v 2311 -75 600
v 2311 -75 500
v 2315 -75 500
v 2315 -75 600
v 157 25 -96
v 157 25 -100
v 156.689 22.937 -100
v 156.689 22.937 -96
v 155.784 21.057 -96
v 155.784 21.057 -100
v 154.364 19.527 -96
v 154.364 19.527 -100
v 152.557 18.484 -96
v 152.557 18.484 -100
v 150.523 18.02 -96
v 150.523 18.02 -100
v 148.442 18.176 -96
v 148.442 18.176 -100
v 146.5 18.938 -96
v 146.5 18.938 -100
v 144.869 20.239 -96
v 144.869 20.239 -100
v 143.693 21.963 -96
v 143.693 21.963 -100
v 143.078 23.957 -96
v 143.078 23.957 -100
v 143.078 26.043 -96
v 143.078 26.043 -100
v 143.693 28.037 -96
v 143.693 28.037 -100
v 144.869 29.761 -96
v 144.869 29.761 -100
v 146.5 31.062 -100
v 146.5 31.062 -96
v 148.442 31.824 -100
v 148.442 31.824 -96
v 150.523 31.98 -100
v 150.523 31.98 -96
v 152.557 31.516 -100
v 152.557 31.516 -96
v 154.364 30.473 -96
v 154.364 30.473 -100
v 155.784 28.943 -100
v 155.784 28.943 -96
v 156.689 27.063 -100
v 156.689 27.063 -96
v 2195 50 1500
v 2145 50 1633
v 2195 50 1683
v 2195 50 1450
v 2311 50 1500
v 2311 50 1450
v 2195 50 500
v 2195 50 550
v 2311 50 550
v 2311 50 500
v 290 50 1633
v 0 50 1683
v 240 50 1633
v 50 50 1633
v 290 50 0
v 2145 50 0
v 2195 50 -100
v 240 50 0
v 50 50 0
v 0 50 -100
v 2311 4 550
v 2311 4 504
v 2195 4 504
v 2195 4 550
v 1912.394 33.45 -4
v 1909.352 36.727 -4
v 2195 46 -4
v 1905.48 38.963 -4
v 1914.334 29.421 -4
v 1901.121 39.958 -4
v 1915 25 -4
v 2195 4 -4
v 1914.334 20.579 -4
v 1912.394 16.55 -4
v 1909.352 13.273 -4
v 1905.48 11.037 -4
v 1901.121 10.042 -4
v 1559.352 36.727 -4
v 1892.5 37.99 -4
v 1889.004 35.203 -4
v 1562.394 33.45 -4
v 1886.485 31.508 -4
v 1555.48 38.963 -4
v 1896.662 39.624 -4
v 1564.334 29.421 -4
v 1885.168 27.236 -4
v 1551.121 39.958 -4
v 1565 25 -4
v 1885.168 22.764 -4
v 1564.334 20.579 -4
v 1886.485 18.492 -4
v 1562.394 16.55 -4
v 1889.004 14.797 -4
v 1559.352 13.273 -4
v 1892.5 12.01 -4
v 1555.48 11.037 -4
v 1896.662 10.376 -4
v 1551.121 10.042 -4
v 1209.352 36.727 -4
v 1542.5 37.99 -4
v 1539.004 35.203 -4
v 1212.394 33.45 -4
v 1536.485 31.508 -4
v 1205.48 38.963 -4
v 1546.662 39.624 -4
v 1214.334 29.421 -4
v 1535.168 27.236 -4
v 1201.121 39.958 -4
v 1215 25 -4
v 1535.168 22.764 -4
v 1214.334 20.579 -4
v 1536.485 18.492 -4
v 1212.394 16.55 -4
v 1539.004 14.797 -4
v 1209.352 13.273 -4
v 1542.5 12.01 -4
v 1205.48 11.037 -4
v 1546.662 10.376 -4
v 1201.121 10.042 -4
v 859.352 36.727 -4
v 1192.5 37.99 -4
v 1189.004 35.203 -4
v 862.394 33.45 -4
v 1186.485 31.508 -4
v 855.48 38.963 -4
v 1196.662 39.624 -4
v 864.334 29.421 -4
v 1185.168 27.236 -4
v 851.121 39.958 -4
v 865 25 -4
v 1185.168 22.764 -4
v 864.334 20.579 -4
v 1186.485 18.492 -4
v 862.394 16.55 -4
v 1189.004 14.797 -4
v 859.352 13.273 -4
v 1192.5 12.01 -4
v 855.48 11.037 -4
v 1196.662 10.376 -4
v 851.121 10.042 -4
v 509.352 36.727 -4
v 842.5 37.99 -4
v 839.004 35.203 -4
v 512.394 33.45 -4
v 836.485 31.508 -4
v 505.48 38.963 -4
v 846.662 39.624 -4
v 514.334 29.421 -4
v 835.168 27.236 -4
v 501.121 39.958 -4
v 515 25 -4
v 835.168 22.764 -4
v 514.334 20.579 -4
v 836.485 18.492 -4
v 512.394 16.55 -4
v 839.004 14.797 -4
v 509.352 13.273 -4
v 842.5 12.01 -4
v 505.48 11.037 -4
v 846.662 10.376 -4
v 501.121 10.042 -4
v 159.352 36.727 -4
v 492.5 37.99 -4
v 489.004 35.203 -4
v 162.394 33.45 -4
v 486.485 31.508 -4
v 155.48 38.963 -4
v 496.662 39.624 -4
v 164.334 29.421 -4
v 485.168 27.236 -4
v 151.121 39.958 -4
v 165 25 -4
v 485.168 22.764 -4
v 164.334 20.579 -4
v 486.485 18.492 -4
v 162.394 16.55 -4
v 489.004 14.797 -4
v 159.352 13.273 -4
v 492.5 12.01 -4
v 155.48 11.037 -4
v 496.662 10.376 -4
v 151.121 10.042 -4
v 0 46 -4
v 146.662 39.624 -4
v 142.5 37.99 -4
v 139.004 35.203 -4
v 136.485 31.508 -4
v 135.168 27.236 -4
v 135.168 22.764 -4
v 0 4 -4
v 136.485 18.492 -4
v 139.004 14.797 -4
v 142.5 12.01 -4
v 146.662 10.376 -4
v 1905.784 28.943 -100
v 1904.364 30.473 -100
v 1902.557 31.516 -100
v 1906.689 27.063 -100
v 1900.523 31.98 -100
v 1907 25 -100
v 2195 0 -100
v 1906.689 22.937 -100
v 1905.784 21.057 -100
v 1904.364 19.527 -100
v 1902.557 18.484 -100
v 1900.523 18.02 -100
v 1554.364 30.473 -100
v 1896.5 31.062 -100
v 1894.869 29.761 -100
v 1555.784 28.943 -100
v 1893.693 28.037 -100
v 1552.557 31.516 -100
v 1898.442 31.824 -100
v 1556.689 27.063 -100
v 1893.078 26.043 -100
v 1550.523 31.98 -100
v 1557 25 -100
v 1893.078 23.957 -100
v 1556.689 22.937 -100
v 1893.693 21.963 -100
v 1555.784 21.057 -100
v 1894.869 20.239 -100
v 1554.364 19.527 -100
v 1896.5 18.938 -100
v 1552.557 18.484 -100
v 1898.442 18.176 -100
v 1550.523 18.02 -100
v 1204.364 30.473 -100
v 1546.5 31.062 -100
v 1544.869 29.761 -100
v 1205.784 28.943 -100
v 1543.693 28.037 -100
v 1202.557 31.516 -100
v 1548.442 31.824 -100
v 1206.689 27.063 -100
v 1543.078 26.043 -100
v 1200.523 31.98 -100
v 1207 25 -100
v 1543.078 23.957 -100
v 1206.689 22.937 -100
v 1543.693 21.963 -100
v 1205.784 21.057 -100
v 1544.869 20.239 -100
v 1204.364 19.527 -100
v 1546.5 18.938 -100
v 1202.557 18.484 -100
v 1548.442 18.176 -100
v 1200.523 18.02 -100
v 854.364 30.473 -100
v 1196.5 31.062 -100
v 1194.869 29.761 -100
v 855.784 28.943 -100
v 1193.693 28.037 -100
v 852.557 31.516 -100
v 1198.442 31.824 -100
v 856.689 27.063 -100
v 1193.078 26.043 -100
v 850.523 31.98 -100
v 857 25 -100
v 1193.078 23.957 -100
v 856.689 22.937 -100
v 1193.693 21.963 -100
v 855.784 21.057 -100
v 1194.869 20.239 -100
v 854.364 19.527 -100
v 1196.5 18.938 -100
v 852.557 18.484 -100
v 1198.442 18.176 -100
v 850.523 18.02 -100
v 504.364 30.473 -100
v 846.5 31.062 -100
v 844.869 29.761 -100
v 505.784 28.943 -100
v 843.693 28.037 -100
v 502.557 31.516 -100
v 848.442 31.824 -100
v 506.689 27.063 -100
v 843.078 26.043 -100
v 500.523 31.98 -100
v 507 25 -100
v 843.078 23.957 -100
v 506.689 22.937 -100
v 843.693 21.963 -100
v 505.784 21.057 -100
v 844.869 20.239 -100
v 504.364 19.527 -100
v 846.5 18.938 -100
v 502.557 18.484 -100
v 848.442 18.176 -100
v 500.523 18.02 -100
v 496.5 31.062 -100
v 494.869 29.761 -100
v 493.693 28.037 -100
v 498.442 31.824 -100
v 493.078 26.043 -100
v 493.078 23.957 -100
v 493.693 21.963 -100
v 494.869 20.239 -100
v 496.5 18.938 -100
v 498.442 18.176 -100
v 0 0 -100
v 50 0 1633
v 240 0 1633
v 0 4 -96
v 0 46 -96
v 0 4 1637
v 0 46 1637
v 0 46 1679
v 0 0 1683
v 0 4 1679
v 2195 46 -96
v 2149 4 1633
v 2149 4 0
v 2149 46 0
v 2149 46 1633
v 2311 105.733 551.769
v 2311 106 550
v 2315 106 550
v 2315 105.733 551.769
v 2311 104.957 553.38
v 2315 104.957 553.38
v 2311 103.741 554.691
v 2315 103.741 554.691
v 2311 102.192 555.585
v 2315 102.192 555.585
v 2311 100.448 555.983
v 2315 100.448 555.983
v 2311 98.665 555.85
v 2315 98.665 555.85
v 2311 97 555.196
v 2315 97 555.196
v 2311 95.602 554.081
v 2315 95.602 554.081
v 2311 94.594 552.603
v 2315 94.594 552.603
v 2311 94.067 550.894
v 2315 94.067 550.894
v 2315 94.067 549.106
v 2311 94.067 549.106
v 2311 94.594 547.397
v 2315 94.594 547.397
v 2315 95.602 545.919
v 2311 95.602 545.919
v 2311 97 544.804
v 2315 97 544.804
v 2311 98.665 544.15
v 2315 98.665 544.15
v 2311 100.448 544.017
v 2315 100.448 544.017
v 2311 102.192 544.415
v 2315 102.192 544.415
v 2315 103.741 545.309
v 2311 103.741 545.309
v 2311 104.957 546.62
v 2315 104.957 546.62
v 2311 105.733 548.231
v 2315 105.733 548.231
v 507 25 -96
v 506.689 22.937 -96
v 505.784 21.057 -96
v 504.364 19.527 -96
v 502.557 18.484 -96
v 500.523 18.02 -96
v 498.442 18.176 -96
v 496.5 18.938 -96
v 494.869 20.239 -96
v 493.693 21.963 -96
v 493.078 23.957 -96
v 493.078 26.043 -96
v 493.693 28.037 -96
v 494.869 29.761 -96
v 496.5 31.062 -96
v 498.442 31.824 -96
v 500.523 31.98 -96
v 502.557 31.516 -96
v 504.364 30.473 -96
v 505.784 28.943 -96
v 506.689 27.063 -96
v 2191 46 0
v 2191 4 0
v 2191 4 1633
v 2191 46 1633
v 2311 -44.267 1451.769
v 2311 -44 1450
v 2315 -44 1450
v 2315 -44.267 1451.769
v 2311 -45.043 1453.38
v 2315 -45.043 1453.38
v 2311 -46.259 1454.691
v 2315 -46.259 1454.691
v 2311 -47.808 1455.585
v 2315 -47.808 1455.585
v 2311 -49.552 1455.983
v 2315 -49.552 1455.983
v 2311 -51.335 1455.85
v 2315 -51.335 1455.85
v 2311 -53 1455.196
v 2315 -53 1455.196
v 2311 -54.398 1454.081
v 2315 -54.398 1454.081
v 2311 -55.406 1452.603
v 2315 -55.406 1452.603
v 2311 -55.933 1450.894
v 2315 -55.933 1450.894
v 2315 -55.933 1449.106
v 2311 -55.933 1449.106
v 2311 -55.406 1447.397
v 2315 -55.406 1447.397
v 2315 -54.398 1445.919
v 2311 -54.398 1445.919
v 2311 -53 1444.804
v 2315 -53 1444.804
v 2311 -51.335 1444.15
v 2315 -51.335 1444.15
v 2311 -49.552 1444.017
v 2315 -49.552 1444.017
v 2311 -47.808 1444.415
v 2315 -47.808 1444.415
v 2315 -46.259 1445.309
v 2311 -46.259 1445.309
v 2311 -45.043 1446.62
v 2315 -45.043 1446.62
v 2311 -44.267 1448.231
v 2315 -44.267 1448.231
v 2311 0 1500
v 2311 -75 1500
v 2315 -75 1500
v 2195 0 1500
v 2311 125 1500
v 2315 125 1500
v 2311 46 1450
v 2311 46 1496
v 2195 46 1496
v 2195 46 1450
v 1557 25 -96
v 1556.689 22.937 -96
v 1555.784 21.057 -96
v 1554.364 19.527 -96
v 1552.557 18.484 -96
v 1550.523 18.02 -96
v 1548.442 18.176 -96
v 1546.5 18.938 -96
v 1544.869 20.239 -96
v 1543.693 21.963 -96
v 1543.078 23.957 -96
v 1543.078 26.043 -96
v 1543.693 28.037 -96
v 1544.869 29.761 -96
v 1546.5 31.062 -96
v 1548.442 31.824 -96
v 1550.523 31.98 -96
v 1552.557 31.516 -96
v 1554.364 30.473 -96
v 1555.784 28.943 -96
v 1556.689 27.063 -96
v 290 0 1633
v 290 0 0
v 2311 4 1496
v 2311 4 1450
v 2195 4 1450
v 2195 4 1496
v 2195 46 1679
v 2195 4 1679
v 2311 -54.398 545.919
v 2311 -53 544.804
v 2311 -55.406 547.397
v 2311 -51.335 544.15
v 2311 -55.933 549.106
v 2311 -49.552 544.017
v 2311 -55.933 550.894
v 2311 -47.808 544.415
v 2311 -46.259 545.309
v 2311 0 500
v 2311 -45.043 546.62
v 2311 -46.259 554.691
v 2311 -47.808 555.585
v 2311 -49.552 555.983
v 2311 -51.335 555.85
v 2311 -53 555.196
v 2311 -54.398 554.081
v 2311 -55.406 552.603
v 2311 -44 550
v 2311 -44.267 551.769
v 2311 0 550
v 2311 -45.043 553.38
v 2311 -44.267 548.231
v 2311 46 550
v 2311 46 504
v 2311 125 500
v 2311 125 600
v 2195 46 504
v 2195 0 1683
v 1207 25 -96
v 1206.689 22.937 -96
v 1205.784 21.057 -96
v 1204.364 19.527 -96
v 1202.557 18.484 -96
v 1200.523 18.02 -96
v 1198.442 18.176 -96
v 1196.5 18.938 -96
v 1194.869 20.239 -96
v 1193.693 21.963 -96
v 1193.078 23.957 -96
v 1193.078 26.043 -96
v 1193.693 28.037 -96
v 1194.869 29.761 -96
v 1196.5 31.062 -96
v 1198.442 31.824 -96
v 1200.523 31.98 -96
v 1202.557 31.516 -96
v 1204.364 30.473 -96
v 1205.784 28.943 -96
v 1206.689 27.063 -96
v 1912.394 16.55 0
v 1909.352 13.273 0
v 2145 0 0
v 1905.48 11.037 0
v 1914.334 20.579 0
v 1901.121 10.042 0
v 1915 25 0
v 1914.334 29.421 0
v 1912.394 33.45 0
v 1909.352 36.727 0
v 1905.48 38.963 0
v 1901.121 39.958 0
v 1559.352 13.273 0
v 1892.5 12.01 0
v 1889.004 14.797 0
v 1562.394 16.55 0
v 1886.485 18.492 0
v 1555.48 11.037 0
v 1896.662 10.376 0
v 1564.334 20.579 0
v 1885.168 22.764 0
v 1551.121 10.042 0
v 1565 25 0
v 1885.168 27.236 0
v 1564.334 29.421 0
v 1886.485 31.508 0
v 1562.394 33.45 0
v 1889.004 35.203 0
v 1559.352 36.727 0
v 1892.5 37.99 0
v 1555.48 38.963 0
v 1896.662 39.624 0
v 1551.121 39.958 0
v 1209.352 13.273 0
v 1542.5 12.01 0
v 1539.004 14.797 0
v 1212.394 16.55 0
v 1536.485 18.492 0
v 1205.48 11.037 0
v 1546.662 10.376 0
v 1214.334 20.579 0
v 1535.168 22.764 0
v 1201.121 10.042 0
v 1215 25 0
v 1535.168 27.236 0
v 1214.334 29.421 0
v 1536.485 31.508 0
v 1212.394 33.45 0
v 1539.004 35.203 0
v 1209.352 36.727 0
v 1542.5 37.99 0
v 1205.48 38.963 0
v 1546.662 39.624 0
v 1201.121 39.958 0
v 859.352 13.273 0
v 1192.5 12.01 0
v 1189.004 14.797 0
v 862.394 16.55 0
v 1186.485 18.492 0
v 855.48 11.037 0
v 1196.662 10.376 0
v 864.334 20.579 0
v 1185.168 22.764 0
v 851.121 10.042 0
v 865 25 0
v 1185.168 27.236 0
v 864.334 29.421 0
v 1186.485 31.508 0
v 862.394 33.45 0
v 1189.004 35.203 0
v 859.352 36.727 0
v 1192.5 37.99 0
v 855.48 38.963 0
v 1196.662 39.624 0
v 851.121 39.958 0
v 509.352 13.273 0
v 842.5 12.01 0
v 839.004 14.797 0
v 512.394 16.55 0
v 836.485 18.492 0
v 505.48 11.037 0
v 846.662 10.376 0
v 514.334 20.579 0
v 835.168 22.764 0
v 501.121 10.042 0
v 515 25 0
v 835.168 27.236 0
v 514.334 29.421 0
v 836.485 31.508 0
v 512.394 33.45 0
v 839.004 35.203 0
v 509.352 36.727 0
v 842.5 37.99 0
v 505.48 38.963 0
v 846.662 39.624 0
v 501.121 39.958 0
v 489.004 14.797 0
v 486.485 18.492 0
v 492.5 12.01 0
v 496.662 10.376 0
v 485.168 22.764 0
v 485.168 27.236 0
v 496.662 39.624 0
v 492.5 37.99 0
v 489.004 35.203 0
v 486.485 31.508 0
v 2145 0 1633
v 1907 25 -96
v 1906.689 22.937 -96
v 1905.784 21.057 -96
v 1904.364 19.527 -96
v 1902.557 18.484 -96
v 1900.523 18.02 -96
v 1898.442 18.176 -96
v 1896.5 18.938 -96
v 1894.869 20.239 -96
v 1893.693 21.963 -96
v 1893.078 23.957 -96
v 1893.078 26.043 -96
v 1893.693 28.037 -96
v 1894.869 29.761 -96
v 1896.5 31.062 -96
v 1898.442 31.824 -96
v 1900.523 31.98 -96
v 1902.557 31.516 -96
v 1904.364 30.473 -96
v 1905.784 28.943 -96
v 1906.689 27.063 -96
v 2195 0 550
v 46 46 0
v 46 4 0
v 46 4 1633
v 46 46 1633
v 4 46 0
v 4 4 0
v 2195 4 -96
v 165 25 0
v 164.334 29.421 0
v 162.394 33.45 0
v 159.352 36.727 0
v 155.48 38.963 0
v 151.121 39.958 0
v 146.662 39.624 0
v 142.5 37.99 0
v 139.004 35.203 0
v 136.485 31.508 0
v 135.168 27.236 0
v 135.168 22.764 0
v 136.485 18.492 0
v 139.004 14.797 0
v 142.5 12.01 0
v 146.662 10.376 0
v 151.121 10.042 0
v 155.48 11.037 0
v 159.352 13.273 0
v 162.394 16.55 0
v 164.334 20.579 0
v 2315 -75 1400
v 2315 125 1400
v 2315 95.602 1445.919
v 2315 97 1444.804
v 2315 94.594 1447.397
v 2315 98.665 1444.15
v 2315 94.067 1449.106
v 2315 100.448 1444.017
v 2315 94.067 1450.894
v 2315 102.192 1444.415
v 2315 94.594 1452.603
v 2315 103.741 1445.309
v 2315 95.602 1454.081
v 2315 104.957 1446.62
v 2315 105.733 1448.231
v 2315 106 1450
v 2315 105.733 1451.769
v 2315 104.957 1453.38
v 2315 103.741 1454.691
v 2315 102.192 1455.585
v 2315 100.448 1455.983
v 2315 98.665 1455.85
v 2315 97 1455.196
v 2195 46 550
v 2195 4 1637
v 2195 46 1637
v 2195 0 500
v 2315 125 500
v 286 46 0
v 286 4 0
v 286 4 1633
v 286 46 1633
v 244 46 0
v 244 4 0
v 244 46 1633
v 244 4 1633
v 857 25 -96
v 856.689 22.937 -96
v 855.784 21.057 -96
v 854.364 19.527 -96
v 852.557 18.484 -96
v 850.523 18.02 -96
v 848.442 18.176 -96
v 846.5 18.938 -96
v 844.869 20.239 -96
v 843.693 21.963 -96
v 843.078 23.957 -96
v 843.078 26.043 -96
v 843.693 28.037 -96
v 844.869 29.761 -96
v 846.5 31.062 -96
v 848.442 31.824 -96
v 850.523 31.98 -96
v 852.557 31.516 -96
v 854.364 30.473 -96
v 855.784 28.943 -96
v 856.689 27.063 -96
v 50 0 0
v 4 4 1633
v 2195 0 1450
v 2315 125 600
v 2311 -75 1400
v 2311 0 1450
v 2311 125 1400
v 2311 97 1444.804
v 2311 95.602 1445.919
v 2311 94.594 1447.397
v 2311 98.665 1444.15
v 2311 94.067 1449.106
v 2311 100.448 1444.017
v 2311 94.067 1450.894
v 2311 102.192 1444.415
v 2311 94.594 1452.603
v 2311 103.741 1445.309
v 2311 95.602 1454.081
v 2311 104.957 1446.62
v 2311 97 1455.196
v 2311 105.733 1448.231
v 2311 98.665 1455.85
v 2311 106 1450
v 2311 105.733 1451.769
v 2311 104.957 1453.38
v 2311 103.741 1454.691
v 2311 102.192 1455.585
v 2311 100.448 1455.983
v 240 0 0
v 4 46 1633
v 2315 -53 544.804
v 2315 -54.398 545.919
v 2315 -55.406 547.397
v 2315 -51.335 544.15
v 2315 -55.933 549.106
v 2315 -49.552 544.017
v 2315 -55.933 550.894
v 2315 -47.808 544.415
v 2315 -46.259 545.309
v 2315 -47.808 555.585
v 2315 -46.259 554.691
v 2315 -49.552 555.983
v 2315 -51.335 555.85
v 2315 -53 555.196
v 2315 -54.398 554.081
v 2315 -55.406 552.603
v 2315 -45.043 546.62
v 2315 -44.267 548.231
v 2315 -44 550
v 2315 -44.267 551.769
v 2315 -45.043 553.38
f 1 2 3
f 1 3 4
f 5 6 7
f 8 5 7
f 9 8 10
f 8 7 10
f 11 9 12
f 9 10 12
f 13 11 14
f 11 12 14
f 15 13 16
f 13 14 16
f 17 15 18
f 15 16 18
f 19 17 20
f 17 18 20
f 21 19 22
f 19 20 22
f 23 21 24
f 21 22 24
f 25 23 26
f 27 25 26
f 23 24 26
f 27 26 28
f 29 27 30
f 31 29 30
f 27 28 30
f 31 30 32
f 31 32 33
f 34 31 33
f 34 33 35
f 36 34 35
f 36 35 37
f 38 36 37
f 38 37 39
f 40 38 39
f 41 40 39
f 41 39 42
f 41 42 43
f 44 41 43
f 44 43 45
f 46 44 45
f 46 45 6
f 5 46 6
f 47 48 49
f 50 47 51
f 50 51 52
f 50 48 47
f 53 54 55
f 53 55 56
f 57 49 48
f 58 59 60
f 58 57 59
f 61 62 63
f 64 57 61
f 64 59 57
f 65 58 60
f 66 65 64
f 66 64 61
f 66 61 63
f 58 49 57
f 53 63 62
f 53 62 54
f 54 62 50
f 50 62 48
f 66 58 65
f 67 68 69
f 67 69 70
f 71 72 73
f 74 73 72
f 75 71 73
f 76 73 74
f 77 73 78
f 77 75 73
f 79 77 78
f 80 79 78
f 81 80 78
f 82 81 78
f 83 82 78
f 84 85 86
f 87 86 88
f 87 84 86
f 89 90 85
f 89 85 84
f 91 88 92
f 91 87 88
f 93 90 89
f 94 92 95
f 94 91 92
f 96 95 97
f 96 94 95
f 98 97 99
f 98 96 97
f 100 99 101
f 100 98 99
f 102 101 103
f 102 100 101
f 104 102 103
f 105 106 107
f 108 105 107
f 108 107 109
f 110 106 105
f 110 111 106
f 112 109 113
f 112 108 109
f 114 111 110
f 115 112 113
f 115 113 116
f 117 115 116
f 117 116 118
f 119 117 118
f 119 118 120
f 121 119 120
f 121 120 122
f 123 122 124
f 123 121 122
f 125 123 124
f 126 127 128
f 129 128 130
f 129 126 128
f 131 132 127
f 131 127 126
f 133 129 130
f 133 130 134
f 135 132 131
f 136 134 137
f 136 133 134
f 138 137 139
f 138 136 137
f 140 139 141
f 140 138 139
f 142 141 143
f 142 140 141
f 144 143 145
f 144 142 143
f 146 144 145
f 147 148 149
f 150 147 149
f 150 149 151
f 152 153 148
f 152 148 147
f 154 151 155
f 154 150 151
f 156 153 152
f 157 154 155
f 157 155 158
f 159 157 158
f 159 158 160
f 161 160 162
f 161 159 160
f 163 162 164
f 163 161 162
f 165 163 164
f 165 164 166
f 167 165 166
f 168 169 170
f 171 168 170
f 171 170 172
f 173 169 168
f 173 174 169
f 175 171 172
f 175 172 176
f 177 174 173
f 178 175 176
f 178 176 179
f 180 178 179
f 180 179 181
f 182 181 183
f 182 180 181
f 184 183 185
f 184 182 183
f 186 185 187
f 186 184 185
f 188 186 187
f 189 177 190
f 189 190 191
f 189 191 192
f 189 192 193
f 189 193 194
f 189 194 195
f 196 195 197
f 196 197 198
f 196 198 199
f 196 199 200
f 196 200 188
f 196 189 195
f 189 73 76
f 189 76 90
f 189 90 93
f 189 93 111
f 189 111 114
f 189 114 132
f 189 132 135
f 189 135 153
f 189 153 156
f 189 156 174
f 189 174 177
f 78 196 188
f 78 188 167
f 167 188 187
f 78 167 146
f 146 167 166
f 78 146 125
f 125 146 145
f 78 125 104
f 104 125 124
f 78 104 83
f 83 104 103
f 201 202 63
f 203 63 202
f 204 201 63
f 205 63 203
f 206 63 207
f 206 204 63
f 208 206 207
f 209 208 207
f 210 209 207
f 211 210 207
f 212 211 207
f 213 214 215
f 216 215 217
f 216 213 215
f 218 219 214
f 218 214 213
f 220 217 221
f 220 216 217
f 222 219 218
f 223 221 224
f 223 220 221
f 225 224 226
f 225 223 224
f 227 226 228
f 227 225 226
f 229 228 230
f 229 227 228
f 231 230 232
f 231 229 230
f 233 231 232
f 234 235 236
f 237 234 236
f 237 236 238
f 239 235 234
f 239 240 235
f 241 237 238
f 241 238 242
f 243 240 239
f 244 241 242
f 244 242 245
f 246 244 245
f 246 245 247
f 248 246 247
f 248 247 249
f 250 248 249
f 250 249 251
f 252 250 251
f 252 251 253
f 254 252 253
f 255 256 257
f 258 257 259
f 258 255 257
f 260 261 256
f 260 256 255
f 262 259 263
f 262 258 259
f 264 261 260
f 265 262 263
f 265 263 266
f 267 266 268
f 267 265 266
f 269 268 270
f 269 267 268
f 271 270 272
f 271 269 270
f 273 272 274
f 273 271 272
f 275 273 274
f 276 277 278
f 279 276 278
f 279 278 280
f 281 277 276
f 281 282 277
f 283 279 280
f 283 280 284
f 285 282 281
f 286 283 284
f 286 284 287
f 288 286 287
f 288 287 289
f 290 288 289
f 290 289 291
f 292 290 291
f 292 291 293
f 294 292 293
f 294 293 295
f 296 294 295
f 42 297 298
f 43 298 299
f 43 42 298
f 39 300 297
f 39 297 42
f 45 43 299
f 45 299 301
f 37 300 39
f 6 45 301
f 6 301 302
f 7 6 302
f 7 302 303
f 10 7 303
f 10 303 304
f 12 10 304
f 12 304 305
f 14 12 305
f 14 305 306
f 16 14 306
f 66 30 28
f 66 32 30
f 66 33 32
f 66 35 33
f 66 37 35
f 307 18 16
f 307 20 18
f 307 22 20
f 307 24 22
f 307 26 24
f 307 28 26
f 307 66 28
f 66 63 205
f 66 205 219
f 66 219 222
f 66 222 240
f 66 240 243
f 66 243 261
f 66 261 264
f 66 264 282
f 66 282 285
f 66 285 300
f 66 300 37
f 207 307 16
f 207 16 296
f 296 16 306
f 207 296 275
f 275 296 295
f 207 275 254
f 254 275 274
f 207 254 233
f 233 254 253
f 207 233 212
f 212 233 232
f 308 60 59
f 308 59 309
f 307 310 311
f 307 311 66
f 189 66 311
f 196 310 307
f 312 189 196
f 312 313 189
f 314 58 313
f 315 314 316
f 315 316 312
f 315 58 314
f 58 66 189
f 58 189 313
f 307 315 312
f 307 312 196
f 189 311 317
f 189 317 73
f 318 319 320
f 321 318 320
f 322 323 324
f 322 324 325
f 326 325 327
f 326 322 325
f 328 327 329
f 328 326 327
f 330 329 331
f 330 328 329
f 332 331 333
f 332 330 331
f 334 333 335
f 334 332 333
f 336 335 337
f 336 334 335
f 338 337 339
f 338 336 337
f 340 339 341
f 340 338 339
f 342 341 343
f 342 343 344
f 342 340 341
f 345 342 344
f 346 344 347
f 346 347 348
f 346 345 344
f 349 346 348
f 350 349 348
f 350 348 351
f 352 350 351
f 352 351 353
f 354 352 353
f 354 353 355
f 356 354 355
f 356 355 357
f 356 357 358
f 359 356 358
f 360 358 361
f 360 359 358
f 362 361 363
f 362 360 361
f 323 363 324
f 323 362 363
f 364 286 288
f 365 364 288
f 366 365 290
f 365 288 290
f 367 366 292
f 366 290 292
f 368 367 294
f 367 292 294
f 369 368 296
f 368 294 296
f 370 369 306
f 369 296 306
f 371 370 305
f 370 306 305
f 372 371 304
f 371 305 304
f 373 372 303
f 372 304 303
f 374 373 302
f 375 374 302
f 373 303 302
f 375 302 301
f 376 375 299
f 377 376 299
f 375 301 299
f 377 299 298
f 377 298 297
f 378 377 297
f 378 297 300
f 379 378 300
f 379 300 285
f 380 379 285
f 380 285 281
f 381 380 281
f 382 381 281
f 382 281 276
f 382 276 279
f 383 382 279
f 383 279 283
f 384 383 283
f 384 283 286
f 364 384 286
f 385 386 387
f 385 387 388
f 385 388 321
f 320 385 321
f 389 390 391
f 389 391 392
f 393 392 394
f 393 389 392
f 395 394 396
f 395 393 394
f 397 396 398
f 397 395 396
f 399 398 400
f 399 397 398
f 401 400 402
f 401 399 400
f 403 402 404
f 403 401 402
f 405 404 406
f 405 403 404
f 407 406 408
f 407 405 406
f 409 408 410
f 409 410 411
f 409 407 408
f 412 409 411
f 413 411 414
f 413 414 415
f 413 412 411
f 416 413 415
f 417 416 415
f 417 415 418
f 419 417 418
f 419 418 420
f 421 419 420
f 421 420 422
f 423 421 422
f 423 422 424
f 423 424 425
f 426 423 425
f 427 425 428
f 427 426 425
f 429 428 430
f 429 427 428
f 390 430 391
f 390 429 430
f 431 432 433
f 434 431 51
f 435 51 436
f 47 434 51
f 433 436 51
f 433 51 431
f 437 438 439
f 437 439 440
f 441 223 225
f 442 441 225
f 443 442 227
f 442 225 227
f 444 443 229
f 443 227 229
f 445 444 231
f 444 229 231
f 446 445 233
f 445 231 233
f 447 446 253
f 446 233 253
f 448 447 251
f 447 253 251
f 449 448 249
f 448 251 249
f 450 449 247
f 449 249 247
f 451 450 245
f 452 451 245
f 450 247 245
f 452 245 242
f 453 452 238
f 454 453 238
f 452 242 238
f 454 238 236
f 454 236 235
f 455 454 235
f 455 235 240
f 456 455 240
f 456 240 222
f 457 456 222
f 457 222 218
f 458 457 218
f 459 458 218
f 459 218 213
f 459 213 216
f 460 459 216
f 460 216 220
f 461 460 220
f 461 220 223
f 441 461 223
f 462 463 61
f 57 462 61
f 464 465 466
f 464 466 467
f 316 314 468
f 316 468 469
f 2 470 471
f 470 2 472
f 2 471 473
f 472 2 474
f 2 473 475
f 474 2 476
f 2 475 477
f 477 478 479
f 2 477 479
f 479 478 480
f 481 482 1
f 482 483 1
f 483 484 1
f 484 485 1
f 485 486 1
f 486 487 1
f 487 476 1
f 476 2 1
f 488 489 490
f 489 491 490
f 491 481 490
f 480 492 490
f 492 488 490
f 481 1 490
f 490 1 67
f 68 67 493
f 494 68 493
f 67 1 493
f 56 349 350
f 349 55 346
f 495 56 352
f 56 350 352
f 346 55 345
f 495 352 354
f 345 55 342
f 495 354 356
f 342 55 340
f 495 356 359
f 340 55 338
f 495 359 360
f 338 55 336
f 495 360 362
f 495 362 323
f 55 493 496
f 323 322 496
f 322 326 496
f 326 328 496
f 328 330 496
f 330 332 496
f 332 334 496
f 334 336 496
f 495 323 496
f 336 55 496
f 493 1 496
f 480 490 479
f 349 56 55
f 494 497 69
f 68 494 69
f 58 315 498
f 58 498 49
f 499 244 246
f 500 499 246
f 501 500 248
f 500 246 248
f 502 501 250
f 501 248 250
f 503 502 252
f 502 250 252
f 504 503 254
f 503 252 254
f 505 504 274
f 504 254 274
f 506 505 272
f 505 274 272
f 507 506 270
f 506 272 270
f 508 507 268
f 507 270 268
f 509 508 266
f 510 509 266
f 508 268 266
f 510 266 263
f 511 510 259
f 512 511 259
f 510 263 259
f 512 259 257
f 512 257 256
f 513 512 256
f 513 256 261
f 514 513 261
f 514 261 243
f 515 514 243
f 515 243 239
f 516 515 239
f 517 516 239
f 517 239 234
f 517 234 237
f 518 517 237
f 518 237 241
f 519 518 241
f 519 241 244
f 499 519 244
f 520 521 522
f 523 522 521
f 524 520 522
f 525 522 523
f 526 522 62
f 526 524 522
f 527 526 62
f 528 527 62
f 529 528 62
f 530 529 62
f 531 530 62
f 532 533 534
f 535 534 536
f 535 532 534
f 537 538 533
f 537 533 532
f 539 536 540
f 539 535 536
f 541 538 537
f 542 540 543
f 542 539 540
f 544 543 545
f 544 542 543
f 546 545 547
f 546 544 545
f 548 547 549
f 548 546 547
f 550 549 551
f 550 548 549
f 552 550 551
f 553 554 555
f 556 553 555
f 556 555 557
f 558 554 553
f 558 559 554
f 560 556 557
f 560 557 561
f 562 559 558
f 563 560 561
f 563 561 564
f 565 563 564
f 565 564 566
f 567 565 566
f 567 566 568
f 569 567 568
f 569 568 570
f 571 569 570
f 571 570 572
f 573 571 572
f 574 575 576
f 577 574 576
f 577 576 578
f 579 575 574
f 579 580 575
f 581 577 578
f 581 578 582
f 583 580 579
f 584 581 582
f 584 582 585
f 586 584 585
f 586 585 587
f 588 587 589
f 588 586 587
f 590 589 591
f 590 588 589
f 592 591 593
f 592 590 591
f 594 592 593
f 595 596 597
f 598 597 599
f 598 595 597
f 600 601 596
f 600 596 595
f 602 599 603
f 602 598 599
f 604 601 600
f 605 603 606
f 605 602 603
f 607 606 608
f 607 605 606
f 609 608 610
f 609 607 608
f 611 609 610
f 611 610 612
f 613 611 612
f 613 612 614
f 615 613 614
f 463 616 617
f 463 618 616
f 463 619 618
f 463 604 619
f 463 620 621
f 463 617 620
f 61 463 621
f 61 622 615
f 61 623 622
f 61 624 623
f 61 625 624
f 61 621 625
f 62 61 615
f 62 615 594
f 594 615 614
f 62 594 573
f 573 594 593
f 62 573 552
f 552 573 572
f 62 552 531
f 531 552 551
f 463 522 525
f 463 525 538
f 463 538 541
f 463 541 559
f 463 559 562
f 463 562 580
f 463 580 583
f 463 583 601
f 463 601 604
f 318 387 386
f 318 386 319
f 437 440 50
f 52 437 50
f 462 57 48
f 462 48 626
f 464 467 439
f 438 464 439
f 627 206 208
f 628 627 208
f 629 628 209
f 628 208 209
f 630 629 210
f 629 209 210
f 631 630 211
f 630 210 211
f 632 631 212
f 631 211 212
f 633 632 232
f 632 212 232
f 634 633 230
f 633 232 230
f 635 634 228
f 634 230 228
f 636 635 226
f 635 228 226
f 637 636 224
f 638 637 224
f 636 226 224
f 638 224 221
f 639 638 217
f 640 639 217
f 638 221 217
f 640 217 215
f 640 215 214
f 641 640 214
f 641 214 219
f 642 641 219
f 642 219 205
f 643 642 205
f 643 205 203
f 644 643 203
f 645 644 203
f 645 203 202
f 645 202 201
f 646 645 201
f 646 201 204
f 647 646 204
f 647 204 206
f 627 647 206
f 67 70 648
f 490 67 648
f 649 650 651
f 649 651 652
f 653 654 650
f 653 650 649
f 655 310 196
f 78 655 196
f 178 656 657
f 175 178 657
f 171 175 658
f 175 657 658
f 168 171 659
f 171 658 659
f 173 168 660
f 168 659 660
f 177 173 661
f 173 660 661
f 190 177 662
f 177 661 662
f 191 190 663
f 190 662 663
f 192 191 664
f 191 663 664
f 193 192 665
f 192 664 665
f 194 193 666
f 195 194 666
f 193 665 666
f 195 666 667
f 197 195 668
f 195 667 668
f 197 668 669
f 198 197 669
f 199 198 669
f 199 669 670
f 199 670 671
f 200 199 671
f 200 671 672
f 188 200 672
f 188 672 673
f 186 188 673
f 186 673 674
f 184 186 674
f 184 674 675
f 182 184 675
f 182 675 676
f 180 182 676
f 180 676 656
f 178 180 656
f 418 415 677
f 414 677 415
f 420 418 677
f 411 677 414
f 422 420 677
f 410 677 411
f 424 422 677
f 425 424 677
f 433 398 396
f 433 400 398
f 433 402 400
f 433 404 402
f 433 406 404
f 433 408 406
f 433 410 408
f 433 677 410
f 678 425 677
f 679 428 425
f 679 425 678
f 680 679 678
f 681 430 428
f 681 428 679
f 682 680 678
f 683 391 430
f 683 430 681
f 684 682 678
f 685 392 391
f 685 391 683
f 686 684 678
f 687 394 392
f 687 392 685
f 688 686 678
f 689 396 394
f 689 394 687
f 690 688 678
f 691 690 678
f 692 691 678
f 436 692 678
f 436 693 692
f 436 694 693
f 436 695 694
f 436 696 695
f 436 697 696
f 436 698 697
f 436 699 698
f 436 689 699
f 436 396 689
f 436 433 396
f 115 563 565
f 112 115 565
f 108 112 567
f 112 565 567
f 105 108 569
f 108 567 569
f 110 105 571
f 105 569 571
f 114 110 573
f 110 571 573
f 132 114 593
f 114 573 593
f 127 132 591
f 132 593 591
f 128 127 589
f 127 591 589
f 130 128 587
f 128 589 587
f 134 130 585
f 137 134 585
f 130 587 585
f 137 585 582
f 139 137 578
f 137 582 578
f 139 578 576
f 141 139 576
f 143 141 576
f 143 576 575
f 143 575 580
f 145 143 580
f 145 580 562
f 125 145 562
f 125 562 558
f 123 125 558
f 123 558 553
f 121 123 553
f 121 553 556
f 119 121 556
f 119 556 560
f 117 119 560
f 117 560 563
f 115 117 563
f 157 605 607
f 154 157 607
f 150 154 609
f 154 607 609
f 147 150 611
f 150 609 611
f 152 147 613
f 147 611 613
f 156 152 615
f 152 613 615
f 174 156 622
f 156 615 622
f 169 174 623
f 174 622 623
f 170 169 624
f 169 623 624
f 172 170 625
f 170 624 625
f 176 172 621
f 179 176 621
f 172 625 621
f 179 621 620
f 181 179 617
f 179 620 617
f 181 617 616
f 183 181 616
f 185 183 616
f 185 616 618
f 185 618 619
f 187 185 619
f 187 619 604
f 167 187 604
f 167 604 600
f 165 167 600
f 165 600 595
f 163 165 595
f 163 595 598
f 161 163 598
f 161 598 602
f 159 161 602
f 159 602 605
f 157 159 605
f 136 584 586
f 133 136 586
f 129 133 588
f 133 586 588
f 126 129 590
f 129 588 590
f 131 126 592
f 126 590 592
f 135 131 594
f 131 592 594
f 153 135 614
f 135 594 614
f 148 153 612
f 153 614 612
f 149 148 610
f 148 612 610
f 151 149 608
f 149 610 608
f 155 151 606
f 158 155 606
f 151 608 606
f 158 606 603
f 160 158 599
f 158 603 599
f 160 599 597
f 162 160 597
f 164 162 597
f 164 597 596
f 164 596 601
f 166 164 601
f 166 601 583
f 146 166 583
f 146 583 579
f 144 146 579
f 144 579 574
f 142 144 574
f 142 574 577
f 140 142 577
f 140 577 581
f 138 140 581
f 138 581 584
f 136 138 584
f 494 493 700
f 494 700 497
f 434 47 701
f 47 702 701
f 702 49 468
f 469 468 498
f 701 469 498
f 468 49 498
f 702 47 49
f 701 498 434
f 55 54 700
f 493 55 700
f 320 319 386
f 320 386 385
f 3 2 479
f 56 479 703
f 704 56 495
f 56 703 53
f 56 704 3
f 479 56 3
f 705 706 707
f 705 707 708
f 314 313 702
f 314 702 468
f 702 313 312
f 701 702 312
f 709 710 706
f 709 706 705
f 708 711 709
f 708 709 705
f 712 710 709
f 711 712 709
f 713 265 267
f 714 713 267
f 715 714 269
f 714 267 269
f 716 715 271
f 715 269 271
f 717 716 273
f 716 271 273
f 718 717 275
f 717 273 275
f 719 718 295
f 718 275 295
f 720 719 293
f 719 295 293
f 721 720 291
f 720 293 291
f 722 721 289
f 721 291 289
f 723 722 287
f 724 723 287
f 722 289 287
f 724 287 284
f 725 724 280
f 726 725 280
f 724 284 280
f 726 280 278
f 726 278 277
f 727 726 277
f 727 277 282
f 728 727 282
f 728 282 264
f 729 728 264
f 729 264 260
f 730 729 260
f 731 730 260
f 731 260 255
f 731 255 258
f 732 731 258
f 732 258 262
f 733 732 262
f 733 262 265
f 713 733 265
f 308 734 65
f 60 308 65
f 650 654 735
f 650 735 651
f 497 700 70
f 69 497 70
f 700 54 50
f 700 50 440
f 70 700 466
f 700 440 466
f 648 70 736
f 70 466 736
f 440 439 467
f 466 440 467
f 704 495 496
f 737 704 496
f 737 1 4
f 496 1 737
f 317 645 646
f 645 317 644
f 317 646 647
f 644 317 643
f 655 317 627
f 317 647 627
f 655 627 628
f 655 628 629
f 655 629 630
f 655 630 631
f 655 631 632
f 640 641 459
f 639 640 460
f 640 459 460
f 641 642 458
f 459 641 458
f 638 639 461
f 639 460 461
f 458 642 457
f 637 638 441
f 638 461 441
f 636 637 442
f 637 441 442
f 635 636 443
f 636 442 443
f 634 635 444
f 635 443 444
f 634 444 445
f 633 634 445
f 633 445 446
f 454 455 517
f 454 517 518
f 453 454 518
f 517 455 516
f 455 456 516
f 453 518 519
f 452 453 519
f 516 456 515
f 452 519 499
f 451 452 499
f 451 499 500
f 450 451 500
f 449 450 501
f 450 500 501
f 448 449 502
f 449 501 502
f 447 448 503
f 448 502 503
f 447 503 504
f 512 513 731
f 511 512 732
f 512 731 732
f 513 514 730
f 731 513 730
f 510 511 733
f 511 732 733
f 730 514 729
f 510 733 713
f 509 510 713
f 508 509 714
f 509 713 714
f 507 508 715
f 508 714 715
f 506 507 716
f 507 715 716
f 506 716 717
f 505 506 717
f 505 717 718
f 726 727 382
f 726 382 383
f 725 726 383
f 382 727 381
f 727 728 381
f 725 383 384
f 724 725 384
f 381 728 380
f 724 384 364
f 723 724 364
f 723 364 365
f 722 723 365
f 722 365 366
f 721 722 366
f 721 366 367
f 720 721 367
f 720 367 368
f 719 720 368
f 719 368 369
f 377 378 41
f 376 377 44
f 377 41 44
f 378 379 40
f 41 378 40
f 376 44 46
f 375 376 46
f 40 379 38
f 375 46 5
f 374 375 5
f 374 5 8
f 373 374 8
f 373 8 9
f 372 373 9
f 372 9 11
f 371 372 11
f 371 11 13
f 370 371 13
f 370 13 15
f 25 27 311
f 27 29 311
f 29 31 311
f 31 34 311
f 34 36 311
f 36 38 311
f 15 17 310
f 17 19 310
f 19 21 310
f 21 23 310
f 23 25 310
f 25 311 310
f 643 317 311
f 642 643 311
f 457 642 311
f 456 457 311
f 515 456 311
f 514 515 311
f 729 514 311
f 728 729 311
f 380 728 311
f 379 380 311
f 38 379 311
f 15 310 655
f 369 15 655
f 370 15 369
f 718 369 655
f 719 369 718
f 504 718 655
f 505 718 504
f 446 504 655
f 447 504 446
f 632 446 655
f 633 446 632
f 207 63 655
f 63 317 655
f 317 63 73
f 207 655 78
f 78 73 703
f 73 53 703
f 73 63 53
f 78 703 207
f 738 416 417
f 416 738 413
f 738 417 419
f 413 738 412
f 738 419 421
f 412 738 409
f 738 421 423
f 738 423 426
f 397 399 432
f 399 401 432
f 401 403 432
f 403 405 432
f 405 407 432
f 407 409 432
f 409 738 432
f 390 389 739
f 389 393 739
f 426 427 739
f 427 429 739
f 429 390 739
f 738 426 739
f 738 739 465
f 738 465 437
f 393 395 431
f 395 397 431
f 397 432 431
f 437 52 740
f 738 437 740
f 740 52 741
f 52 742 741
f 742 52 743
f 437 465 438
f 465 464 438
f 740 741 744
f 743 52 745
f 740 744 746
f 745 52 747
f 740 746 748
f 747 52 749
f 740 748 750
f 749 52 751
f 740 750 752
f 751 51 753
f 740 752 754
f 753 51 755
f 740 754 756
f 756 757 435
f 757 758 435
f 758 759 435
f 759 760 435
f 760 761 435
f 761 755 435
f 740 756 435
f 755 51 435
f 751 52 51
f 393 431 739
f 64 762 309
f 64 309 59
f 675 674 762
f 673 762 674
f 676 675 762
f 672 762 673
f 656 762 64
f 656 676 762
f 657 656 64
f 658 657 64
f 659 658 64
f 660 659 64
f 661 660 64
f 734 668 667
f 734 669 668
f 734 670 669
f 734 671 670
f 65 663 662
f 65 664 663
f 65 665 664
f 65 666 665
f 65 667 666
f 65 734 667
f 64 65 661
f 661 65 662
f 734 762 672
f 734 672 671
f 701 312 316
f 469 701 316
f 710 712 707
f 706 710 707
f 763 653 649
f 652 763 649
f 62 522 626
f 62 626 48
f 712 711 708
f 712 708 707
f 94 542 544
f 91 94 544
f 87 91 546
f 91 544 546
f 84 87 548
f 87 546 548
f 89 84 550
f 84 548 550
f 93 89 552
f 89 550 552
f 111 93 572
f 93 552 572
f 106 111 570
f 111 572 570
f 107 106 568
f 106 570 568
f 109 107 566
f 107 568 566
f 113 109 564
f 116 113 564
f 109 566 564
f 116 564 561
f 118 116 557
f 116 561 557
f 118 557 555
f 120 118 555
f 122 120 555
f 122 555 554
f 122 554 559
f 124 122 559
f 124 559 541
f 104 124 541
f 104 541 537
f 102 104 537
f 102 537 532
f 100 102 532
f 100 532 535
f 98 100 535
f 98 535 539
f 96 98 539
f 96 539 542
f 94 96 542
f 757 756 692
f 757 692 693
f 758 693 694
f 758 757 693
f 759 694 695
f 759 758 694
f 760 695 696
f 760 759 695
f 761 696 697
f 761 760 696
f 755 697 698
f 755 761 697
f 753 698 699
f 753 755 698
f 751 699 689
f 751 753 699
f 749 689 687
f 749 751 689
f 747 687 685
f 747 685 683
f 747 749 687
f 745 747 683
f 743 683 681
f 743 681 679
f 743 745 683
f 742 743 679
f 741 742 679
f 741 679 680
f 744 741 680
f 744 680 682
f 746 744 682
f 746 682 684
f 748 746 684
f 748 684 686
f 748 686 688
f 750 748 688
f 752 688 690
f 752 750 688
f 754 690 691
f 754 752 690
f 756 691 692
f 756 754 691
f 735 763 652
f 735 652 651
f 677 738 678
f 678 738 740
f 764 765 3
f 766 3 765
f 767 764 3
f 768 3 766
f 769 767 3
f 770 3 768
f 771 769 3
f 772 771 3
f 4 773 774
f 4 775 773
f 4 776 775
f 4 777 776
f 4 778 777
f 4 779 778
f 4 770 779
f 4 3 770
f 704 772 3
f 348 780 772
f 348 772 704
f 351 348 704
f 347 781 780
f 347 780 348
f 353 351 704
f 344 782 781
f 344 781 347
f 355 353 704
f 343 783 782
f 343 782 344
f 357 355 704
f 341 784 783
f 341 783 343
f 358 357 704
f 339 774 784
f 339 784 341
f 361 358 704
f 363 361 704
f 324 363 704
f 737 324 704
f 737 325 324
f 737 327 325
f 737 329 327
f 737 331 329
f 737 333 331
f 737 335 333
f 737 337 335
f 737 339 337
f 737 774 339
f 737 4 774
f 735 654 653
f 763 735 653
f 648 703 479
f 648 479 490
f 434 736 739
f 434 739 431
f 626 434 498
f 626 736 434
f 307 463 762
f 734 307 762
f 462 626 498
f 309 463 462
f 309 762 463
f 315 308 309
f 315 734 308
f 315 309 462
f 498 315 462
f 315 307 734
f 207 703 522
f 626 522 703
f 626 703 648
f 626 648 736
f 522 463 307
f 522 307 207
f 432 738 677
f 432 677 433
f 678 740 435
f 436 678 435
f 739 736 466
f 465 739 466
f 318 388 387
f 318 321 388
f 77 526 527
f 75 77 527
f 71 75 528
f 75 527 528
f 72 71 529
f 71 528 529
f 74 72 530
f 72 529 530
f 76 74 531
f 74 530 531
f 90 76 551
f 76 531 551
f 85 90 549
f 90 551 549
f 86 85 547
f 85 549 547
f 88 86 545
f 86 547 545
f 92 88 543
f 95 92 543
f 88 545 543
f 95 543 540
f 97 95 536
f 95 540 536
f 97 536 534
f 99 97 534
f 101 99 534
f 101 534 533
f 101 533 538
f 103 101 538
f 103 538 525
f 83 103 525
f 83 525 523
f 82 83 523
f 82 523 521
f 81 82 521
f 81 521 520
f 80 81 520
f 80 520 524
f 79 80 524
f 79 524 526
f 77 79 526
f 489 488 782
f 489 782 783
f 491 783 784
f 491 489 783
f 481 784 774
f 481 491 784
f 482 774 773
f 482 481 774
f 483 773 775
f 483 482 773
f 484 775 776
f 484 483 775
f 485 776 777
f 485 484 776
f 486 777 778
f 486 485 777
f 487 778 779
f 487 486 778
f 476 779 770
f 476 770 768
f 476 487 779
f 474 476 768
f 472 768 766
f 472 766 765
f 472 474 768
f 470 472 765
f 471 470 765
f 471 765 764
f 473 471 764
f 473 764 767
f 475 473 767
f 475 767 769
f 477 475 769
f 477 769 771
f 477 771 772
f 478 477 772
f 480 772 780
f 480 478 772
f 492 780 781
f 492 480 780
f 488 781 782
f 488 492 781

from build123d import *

# Parameters (mm, degrees)
F0_W      = 42
F0_H      = 42
F1_DEPTH  = 1633
F2_W      = 42
F2_H      = 92
F3_DEPTH  = 2195
F6_W      = 42
F6_H      = 42
F7_DEPTH  = 2195
F9_DEPTH  = 116
F10_W     = 200
F10_H     = 100
F10_R     = 6
F11_DEPTH = 4
F12_W     = 50
F12_H     = 50
F12_W_2   = 42
F12_H_2   = 42
F13_DEPTH = 1633
F14_R     = 7
F15_DEPTH = 125
F16_R     = 15
F16_R_2   = 7
F17_DEPTH = 5


# Not quite as in the source:
# - a feature names something its author has since deleted; it is built from what else it names


with BuildPart() as f1:
    # F0 (on Top) → F1 (new body)
    with BuildSketch(Plane.XY):
        Polygon((0, 4), (0, 0), (50, 0), (50, 50), (0, 50), (0, 46), align=None)
        with Locations((25, 25)):
            Rectangle(F0_W, F0_H, mode=Mode.SUBTRACT)
    extrude(amount=F1_DEPTH)


with BuildPart() as f3:
    # F2 (on face) → F3 (new body)
    with BuildSketch(Plane(origin=(0, 0, 0), x_dir=(0, -1, 0), z_dir=(-1, 0, 0))):
        Polygon((0, 0), (-50, 0), (-50, -4), (-50, -96), (-50, -100), (0, -100), align=None)
        with Locations((-25, -50)):
            Rectangle(F2_W, F2_H, mode=Mode.SUBTRACT)
    extrude(amount=-F3_DEPTH)

    # F5: F1 across plane
    add(f1.part.mirror(Plane.YZ.offset(1097.5)))


with BuildPart() as f1_1:
    add(f1.part)

    add(f3.part)  # F7 merges F3
    # F6 (on face) → F7 (join, through all)
    with BuildSketch(Plane(origin=(0, 0, 0), x_dir=(0, -1, 0), z_dir=(-1, 0, 0))):
        Polygon((-46, 1683), (-50, 1683), (-50, 1633), (0, 1633), (0, 1683), (-4, 1683), align=None)
        with Locations((-25, 1658)):
            Rectangle(F6_W, F6_H, mode=Mode.SUBTRACT)
    extrude(amount=-F7_DEPTH)

    # F8 (on face) → F9 (join)
    with BuildSketch(Plane.YZ.offset(2195)):
        Polygon((4, 550), (0, 550), (0, 500), (50, 500), (50, 550), (46, 550), (46, 504), (4, 504), align=None)
        Polygon((0, 1500), (0, 1450), (4, 1450), (4, 1496), (46, 1496), (46, 1450), (50, 1450), (50, 1500), align=None)
    extrude(amount=F9_DEPTH)

    # F10 (on face) → F11 (join)
    with BuildSketch(Plane.YZ.offset(2311)):
        with Locations((25, 1450)):
            Rectangle(F10_W, F10_H)
        with Locations((-50, 1450)):
            Circle(F10_R, mode=Mode.SUBTRACT)
        with Locations((100, 1450)):
            Circle(F10_R, mode=Mode.SUBTRACT)
        with Locations((25, 550)):
            Rectangle(F10_W, F10_H)
        with Locations((-50, 550)):
            Circle(F10_R, mode=Mode.SUBTRACT)
        with Locations((100, 550)):
            Circle(F10_R, mode=Mode.SUBTRACT)
    extrude(amount=F11_DEPTH)

    # F12 (on face) → F13 (join, through all)
    with BuildSketch(Plane.XY):
        with Locations((265, 25)):
            Rectangle(F12_W, F12_H)
        with Locations((265, 25)):
            Rectangle(F12_W_2, F12_H_2, mode=Mode.SUBTRACT)
    extrude(amount=F13_DEPTH)

    # F14 (on face) → F15 (cut)
    with BuildSketch(Plane(origin=(0, 0, -100), x_dir=(1, 0, 0), z_dir=(0, 0, -1))):
        with Locations((150, -25)):
            Circle(F14_R)
        with Locations((500, -25)):
            Circle(F14_R)
        with Locations((850, -25)):
            Circle(F14_R)
        with Locations((1200, -25)):
            Circle(F14_R)
        with Locations((1550, -25)):
            Circle(F14_R)
        with Locations((1900, -25)):
            Circle(F14_R)
        with Locations((2250, -25)):
            Circle(F14_R)
    extrude(amount=-F15_DEPTH, mode=Mode.SUBTRACT)

    # F16 (on face) → F17 (cut)
    with BuildSketch(Plane.XY):
        with Locations((500, 25)):
            Circle(F16_R)
        with Locations((500, 25)):
            Circle(F16_R_2, mode=Mode.SUBTRACT)
        with Locations((850, 25)):
            Circle(F16_R)
        with Locations((850, 25)):
            Circle(F16_R_2, mode=Mode.SUBTRACT)
        with Locations((1200, 25)):
            Circle(F16_R)
        with Locations((1200, 25)):
            Circle(F16_R_2, mode=Mode.SUBTRACT)
        with Locations((1550, 25)):
            Circle(F16_R)
        with Locations((1550, 25)):
            Circle(F16_R_2, mode=Mode.SUBTRACT)
        with Locations((1900, 25)):
            Circle(F16_R)
        with Locations((1900, 25)):
            Circle(F16_R_2, mode=Mode.SUBTRACT)
        with Locations((150, 25)):
            Circle(F16_R)
    extrude(amount=-F17_DEPTH, mode=Mode.SUBTRACT)


solid = f1_1.part
